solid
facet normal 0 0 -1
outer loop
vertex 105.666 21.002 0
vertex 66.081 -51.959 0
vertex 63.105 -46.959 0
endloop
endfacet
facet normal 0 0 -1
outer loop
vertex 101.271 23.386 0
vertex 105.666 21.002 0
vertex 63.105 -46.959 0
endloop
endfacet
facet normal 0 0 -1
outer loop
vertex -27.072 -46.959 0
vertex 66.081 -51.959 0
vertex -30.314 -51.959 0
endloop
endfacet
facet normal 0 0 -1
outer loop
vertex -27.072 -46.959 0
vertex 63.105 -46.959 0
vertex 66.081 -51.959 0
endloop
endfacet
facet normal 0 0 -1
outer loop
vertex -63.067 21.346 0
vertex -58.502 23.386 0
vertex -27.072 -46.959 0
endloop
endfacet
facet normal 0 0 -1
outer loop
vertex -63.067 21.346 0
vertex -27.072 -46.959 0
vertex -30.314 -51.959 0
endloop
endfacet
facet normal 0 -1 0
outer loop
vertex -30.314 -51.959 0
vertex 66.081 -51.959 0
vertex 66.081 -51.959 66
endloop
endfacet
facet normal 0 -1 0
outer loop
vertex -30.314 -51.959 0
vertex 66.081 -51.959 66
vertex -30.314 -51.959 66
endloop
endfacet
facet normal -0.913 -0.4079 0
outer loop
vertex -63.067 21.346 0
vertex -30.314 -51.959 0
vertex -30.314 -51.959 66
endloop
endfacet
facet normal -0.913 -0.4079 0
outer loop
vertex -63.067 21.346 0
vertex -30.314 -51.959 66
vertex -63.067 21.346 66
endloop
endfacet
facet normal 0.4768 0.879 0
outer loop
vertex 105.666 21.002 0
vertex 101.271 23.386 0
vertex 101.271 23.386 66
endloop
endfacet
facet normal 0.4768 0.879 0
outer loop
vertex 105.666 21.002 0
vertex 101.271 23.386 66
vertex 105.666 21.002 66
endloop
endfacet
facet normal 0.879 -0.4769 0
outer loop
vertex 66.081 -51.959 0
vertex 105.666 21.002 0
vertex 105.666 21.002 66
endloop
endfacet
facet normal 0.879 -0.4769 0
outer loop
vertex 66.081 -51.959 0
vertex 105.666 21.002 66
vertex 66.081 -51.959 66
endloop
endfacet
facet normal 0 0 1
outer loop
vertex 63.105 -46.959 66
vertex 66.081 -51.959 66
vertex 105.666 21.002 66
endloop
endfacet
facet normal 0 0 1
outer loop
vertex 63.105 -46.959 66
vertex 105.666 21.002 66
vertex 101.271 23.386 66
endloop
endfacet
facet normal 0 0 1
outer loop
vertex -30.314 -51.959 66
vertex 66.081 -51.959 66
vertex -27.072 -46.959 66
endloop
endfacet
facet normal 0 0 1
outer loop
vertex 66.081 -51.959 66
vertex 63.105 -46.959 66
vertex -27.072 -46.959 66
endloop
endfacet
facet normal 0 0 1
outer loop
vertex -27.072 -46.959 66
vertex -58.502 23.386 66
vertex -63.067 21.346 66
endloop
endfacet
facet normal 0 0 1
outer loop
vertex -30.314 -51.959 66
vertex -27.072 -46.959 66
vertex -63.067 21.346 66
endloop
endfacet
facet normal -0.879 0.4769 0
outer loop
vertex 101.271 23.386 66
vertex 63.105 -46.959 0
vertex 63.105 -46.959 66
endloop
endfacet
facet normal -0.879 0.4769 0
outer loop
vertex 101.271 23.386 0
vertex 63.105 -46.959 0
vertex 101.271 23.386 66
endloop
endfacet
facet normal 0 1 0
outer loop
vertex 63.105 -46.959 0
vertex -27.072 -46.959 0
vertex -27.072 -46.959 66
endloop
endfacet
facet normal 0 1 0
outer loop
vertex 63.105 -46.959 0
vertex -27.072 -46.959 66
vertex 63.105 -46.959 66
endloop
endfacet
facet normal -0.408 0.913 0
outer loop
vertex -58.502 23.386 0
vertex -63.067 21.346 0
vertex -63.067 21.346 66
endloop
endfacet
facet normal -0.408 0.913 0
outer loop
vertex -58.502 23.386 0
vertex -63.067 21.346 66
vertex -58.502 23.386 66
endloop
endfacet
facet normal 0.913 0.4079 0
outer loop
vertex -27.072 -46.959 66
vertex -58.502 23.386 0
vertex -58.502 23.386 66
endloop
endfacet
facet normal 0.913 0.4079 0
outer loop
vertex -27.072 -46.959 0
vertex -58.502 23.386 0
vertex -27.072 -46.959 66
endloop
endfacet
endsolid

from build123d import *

# Parameters (mm, degrees)
EKSTR_ZYON_NCE1_DEPTH = 66


with BuildPart() as part:
    # Çizim1 → Ekstrüzyon-İnce1 (new body)
    with BuildSketch(Plane.XY):
        Polygon((-58.502445294, 23.386048527), (-27.071596074, -46.959185442), (63.105007045, -46.959185442), (101.271038241, 23.386048527), (105.665865377, 21.001621038), (66.080746967, -51.959185442), (-30.313952532, -51.959185442), (-63.067488848, 21.346348216), align=None)
    extrude(amount=EKSTR_ZYON_NCE1_DEPTH)


solid = part.part
